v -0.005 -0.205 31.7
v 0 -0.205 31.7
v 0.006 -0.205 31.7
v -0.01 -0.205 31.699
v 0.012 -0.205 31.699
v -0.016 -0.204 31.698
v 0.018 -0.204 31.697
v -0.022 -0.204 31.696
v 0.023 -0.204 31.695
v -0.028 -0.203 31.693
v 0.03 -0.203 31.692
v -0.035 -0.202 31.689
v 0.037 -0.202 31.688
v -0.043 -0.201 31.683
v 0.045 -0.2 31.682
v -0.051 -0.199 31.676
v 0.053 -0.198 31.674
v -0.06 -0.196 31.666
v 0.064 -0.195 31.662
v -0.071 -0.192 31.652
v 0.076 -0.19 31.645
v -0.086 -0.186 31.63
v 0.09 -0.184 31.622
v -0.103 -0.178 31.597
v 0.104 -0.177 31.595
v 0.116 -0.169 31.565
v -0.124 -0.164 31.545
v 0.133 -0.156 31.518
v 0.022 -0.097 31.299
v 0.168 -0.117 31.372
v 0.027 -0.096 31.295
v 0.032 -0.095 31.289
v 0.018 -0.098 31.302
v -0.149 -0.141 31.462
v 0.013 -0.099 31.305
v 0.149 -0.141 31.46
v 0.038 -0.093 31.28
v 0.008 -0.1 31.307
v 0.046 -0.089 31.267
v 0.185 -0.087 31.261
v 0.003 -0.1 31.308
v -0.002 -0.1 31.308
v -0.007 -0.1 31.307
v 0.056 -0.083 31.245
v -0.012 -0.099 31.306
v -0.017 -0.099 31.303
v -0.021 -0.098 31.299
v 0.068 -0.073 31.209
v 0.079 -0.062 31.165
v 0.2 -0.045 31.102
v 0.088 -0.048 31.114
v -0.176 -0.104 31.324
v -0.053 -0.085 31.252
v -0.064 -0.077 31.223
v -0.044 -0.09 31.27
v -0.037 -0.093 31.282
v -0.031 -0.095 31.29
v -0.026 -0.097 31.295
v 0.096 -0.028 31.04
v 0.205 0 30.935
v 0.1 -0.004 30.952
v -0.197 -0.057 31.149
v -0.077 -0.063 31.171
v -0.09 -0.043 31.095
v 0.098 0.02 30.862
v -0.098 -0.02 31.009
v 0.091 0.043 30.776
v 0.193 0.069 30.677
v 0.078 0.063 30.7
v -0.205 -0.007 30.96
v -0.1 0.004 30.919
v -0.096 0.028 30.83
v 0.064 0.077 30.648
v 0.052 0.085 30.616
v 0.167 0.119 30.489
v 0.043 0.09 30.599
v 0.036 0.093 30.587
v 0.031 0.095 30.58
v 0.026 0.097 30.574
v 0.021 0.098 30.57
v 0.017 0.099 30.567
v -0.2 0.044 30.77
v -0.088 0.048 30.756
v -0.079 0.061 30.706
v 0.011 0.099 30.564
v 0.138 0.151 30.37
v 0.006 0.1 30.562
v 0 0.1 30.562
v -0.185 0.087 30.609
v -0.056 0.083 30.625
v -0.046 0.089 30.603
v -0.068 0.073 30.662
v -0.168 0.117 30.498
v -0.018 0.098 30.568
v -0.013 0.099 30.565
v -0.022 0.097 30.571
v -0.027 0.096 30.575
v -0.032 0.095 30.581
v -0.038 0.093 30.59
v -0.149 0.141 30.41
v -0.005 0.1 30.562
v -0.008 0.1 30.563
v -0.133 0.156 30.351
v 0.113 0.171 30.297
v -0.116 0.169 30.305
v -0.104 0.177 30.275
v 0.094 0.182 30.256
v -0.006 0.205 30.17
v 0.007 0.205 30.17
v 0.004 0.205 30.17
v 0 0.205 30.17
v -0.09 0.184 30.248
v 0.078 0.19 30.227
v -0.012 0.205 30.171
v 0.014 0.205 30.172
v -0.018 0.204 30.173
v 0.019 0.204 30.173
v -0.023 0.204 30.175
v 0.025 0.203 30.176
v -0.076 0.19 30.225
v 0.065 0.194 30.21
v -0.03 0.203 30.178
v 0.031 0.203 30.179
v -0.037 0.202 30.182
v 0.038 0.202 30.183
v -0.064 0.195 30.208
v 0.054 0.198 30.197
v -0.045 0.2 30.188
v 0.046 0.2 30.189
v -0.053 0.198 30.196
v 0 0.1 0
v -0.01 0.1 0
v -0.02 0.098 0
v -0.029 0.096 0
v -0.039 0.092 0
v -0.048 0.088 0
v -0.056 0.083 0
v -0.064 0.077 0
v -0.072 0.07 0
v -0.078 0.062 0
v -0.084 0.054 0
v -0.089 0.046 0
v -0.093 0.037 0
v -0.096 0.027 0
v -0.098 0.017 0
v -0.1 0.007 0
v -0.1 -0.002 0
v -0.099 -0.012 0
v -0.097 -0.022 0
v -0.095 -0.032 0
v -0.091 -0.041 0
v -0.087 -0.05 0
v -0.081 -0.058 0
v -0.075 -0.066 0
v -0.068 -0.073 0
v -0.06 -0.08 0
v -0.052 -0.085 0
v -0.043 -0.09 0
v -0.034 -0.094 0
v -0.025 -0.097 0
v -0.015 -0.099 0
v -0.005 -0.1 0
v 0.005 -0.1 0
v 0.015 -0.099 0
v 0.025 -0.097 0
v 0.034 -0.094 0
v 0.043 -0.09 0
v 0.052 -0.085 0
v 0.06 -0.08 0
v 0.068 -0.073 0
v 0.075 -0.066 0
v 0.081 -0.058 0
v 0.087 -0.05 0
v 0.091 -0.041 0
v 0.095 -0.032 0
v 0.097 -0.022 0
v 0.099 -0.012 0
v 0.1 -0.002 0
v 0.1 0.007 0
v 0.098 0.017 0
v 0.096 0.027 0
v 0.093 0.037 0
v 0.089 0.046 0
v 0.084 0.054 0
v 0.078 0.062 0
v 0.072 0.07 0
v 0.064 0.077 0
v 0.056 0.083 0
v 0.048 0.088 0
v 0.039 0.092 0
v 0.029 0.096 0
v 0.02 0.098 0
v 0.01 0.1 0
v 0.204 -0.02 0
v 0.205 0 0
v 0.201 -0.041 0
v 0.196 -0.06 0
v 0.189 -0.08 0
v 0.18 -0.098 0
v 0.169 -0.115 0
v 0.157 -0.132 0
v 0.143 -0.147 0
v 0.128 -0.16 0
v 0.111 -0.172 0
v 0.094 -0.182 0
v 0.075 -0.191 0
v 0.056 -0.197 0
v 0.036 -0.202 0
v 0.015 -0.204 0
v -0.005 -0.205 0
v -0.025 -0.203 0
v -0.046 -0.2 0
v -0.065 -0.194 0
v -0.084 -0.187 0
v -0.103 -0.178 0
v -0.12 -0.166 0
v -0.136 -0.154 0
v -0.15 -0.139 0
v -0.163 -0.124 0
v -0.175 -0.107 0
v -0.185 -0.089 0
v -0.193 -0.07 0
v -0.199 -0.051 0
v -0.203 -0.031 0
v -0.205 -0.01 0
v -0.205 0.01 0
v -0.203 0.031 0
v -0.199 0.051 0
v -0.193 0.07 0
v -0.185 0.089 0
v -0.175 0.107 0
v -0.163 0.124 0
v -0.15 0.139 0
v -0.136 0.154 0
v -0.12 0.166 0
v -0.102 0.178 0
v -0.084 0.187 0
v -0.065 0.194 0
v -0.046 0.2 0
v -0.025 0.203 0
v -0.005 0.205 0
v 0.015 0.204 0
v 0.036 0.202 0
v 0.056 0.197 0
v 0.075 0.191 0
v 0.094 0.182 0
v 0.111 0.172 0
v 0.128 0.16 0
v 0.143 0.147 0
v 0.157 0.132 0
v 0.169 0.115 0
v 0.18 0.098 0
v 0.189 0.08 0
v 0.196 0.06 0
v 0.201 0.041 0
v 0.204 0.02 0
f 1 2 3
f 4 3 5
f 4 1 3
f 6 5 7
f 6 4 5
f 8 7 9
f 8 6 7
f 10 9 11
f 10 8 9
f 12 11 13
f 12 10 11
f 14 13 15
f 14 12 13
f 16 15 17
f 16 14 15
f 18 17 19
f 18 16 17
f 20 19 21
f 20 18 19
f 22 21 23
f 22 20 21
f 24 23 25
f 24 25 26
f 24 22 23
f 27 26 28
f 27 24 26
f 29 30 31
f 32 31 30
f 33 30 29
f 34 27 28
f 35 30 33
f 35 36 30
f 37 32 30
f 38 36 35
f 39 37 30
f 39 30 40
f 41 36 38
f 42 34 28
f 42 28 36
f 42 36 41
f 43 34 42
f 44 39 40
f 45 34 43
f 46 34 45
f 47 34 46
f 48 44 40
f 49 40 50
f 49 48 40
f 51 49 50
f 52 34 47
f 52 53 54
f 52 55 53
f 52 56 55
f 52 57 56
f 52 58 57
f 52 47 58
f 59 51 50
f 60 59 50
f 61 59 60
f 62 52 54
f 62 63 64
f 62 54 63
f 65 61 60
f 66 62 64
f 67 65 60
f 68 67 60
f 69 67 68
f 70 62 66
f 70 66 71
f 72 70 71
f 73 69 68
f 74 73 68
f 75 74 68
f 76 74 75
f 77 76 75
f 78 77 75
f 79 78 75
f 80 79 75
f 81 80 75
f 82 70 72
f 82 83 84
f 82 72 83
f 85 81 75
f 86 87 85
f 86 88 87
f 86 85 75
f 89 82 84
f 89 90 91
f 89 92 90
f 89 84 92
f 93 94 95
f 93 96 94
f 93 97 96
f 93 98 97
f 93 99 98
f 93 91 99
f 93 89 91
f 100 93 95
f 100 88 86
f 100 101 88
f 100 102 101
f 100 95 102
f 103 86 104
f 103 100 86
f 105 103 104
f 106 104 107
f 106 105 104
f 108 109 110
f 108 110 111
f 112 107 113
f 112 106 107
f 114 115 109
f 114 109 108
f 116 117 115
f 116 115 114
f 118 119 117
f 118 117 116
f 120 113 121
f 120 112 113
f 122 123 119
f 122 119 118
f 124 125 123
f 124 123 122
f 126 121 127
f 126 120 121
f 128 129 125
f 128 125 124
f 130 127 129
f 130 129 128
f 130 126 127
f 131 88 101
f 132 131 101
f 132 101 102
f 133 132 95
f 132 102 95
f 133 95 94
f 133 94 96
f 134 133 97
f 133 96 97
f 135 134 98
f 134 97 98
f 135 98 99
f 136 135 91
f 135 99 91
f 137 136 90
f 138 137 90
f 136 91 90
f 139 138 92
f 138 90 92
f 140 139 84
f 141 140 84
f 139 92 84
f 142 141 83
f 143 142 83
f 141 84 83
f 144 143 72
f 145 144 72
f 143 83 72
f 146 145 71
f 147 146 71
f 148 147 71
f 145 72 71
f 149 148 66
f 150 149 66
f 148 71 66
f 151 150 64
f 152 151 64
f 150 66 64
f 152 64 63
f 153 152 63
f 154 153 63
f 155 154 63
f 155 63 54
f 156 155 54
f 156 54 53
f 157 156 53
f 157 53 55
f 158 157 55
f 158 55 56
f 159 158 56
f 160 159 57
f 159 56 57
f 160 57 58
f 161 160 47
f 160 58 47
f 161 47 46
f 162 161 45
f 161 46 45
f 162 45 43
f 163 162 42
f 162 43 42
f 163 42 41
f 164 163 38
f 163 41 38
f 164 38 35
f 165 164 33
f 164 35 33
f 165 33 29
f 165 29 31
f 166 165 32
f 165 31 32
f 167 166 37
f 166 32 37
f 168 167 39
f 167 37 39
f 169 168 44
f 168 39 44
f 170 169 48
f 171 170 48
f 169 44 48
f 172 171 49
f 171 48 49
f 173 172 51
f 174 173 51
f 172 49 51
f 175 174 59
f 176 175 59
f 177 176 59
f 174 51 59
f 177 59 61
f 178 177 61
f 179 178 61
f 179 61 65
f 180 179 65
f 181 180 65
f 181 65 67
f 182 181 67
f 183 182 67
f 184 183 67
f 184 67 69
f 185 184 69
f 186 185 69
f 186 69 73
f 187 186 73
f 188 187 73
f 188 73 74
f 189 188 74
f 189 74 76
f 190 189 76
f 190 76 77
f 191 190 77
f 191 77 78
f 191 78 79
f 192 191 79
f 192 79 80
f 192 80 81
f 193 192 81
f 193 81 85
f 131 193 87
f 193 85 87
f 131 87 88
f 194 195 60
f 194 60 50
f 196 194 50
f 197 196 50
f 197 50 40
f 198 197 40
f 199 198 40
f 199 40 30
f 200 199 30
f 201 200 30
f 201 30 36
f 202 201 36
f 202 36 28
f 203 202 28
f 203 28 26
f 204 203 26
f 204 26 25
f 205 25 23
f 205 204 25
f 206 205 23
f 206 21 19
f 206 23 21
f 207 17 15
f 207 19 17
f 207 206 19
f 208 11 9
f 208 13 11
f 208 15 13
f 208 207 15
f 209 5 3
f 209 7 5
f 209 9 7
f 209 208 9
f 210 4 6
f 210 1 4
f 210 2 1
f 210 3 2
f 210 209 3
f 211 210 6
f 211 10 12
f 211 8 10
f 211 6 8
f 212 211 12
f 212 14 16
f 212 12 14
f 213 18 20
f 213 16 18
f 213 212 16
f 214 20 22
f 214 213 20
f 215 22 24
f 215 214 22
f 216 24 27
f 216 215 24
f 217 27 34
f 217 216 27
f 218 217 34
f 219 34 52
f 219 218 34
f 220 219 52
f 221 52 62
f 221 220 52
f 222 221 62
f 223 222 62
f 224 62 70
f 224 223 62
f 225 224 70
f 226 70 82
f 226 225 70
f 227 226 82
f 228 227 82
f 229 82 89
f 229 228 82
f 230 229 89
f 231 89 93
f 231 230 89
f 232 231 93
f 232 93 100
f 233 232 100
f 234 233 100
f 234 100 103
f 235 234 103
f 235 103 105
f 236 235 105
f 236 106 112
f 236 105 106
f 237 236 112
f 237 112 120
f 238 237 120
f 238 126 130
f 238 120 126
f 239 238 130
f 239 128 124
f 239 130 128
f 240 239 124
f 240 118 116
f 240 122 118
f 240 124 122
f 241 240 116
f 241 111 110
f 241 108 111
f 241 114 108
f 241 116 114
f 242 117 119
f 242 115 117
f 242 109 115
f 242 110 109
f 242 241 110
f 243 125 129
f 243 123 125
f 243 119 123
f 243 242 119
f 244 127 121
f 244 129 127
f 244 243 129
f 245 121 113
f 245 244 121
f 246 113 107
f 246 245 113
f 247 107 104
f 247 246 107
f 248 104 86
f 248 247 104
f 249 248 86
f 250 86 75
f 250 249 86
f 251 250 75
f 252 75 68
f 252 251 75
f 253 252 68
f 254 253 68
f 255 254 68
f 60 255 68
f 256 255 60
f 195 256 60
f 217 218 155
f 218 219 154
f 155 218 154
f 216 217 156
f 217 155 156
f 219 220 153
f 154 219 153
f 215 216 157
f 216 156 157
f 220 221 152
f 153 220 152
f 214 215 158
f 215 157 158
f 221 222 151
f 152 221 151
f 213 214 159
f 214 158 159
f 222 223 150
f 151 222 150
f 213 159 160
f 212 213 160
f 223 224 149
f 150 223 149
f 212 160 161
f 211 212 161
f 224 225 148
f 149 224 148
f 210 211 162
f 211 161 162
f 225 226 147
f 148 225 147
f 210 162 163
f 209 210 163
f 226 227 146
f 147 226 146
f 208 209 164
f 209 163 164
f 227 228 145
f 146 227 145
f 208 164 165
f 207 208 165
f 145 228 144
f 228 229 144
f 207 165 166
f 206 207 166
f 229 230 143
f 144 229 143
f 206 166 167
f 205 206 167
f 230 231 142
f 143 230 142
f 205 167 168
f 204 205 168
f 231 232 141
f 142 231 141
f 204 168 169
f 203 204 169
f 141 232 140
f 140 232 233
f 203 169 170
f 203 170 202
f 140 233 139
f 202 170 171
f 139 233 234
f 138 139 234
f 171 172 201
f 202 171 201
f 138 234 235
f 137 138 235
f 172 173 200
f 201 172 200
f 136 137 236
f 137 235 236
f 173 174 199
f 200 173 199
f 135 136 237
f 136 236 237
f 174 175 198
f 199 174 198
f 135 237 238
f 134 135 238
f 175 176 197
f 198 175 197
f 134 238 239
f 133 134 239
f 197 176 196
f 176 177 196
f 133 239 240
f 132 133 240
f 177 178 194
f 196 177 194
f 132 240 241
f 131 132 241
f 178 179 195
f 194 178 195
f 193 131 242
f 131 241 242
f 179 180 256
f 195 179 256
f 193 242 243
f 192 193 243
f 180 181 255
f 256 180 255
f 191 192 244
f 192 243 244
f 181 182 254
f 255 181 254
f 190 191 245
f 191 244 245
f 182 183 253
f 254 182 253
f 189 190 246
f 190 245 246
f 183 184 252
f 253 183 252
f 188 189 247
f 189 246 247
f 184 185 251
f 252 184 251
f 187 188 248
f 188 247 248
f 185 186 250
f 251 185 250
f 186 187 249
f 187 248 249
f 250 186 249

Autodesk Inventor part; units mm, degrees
ref_plane "YZ Plane" through (0, 0, 0) normal (1, 0, 0) x (0, 1, 0)
ref_plane "XZ Plane" through (0, 0, 0) normal (0, 1, 0) x (-1, 0, 0)
ref_plane "XY Plane" through (0, 0, 0) normal (0, 0, 1) x (1, 0, 0)
sketch "Sketch1" plane through (0, 0, 0) normal (0, 0, 1) x (1, 0, 0)
  circle A0 centre (0, 0) radius 0.205
  dimension "d0" = 0.41
extrude "Extrusion5" add sketch "Sketch1" along normal blind 31.7
hole "Hole2" at (0, 0, 0) direction (0, 0, 1) diameter 0.2 end through all
sketch "Sketch10" plane through (0, 0, 0) normal (1, 0, 0) x (0, 1, 0)
  line L0 (0, -6.34) -> (0, 38.04) projected
  line L1 (-0.205, 31.7) -> (0.205, 31.7) projected
  line L2 (0.205, 0) -> (0.205, 31.7) projected
  line L3 (-0.205, 31.7) -> (0.205, 30.1699)
  line L4 (0.205, 31.7) -> (-0.205, 31.7)
  line L5 (0.205, 30.1699) -> (0.205, 31.7)
  point P0 (0, 0)
  dimension "d52" = 15
  dimension "d53" = 1.5301
extrude "Extrusion6" cut sketch "Sketch10" along normal through all both and the other way through all
properties part number "Needle"
